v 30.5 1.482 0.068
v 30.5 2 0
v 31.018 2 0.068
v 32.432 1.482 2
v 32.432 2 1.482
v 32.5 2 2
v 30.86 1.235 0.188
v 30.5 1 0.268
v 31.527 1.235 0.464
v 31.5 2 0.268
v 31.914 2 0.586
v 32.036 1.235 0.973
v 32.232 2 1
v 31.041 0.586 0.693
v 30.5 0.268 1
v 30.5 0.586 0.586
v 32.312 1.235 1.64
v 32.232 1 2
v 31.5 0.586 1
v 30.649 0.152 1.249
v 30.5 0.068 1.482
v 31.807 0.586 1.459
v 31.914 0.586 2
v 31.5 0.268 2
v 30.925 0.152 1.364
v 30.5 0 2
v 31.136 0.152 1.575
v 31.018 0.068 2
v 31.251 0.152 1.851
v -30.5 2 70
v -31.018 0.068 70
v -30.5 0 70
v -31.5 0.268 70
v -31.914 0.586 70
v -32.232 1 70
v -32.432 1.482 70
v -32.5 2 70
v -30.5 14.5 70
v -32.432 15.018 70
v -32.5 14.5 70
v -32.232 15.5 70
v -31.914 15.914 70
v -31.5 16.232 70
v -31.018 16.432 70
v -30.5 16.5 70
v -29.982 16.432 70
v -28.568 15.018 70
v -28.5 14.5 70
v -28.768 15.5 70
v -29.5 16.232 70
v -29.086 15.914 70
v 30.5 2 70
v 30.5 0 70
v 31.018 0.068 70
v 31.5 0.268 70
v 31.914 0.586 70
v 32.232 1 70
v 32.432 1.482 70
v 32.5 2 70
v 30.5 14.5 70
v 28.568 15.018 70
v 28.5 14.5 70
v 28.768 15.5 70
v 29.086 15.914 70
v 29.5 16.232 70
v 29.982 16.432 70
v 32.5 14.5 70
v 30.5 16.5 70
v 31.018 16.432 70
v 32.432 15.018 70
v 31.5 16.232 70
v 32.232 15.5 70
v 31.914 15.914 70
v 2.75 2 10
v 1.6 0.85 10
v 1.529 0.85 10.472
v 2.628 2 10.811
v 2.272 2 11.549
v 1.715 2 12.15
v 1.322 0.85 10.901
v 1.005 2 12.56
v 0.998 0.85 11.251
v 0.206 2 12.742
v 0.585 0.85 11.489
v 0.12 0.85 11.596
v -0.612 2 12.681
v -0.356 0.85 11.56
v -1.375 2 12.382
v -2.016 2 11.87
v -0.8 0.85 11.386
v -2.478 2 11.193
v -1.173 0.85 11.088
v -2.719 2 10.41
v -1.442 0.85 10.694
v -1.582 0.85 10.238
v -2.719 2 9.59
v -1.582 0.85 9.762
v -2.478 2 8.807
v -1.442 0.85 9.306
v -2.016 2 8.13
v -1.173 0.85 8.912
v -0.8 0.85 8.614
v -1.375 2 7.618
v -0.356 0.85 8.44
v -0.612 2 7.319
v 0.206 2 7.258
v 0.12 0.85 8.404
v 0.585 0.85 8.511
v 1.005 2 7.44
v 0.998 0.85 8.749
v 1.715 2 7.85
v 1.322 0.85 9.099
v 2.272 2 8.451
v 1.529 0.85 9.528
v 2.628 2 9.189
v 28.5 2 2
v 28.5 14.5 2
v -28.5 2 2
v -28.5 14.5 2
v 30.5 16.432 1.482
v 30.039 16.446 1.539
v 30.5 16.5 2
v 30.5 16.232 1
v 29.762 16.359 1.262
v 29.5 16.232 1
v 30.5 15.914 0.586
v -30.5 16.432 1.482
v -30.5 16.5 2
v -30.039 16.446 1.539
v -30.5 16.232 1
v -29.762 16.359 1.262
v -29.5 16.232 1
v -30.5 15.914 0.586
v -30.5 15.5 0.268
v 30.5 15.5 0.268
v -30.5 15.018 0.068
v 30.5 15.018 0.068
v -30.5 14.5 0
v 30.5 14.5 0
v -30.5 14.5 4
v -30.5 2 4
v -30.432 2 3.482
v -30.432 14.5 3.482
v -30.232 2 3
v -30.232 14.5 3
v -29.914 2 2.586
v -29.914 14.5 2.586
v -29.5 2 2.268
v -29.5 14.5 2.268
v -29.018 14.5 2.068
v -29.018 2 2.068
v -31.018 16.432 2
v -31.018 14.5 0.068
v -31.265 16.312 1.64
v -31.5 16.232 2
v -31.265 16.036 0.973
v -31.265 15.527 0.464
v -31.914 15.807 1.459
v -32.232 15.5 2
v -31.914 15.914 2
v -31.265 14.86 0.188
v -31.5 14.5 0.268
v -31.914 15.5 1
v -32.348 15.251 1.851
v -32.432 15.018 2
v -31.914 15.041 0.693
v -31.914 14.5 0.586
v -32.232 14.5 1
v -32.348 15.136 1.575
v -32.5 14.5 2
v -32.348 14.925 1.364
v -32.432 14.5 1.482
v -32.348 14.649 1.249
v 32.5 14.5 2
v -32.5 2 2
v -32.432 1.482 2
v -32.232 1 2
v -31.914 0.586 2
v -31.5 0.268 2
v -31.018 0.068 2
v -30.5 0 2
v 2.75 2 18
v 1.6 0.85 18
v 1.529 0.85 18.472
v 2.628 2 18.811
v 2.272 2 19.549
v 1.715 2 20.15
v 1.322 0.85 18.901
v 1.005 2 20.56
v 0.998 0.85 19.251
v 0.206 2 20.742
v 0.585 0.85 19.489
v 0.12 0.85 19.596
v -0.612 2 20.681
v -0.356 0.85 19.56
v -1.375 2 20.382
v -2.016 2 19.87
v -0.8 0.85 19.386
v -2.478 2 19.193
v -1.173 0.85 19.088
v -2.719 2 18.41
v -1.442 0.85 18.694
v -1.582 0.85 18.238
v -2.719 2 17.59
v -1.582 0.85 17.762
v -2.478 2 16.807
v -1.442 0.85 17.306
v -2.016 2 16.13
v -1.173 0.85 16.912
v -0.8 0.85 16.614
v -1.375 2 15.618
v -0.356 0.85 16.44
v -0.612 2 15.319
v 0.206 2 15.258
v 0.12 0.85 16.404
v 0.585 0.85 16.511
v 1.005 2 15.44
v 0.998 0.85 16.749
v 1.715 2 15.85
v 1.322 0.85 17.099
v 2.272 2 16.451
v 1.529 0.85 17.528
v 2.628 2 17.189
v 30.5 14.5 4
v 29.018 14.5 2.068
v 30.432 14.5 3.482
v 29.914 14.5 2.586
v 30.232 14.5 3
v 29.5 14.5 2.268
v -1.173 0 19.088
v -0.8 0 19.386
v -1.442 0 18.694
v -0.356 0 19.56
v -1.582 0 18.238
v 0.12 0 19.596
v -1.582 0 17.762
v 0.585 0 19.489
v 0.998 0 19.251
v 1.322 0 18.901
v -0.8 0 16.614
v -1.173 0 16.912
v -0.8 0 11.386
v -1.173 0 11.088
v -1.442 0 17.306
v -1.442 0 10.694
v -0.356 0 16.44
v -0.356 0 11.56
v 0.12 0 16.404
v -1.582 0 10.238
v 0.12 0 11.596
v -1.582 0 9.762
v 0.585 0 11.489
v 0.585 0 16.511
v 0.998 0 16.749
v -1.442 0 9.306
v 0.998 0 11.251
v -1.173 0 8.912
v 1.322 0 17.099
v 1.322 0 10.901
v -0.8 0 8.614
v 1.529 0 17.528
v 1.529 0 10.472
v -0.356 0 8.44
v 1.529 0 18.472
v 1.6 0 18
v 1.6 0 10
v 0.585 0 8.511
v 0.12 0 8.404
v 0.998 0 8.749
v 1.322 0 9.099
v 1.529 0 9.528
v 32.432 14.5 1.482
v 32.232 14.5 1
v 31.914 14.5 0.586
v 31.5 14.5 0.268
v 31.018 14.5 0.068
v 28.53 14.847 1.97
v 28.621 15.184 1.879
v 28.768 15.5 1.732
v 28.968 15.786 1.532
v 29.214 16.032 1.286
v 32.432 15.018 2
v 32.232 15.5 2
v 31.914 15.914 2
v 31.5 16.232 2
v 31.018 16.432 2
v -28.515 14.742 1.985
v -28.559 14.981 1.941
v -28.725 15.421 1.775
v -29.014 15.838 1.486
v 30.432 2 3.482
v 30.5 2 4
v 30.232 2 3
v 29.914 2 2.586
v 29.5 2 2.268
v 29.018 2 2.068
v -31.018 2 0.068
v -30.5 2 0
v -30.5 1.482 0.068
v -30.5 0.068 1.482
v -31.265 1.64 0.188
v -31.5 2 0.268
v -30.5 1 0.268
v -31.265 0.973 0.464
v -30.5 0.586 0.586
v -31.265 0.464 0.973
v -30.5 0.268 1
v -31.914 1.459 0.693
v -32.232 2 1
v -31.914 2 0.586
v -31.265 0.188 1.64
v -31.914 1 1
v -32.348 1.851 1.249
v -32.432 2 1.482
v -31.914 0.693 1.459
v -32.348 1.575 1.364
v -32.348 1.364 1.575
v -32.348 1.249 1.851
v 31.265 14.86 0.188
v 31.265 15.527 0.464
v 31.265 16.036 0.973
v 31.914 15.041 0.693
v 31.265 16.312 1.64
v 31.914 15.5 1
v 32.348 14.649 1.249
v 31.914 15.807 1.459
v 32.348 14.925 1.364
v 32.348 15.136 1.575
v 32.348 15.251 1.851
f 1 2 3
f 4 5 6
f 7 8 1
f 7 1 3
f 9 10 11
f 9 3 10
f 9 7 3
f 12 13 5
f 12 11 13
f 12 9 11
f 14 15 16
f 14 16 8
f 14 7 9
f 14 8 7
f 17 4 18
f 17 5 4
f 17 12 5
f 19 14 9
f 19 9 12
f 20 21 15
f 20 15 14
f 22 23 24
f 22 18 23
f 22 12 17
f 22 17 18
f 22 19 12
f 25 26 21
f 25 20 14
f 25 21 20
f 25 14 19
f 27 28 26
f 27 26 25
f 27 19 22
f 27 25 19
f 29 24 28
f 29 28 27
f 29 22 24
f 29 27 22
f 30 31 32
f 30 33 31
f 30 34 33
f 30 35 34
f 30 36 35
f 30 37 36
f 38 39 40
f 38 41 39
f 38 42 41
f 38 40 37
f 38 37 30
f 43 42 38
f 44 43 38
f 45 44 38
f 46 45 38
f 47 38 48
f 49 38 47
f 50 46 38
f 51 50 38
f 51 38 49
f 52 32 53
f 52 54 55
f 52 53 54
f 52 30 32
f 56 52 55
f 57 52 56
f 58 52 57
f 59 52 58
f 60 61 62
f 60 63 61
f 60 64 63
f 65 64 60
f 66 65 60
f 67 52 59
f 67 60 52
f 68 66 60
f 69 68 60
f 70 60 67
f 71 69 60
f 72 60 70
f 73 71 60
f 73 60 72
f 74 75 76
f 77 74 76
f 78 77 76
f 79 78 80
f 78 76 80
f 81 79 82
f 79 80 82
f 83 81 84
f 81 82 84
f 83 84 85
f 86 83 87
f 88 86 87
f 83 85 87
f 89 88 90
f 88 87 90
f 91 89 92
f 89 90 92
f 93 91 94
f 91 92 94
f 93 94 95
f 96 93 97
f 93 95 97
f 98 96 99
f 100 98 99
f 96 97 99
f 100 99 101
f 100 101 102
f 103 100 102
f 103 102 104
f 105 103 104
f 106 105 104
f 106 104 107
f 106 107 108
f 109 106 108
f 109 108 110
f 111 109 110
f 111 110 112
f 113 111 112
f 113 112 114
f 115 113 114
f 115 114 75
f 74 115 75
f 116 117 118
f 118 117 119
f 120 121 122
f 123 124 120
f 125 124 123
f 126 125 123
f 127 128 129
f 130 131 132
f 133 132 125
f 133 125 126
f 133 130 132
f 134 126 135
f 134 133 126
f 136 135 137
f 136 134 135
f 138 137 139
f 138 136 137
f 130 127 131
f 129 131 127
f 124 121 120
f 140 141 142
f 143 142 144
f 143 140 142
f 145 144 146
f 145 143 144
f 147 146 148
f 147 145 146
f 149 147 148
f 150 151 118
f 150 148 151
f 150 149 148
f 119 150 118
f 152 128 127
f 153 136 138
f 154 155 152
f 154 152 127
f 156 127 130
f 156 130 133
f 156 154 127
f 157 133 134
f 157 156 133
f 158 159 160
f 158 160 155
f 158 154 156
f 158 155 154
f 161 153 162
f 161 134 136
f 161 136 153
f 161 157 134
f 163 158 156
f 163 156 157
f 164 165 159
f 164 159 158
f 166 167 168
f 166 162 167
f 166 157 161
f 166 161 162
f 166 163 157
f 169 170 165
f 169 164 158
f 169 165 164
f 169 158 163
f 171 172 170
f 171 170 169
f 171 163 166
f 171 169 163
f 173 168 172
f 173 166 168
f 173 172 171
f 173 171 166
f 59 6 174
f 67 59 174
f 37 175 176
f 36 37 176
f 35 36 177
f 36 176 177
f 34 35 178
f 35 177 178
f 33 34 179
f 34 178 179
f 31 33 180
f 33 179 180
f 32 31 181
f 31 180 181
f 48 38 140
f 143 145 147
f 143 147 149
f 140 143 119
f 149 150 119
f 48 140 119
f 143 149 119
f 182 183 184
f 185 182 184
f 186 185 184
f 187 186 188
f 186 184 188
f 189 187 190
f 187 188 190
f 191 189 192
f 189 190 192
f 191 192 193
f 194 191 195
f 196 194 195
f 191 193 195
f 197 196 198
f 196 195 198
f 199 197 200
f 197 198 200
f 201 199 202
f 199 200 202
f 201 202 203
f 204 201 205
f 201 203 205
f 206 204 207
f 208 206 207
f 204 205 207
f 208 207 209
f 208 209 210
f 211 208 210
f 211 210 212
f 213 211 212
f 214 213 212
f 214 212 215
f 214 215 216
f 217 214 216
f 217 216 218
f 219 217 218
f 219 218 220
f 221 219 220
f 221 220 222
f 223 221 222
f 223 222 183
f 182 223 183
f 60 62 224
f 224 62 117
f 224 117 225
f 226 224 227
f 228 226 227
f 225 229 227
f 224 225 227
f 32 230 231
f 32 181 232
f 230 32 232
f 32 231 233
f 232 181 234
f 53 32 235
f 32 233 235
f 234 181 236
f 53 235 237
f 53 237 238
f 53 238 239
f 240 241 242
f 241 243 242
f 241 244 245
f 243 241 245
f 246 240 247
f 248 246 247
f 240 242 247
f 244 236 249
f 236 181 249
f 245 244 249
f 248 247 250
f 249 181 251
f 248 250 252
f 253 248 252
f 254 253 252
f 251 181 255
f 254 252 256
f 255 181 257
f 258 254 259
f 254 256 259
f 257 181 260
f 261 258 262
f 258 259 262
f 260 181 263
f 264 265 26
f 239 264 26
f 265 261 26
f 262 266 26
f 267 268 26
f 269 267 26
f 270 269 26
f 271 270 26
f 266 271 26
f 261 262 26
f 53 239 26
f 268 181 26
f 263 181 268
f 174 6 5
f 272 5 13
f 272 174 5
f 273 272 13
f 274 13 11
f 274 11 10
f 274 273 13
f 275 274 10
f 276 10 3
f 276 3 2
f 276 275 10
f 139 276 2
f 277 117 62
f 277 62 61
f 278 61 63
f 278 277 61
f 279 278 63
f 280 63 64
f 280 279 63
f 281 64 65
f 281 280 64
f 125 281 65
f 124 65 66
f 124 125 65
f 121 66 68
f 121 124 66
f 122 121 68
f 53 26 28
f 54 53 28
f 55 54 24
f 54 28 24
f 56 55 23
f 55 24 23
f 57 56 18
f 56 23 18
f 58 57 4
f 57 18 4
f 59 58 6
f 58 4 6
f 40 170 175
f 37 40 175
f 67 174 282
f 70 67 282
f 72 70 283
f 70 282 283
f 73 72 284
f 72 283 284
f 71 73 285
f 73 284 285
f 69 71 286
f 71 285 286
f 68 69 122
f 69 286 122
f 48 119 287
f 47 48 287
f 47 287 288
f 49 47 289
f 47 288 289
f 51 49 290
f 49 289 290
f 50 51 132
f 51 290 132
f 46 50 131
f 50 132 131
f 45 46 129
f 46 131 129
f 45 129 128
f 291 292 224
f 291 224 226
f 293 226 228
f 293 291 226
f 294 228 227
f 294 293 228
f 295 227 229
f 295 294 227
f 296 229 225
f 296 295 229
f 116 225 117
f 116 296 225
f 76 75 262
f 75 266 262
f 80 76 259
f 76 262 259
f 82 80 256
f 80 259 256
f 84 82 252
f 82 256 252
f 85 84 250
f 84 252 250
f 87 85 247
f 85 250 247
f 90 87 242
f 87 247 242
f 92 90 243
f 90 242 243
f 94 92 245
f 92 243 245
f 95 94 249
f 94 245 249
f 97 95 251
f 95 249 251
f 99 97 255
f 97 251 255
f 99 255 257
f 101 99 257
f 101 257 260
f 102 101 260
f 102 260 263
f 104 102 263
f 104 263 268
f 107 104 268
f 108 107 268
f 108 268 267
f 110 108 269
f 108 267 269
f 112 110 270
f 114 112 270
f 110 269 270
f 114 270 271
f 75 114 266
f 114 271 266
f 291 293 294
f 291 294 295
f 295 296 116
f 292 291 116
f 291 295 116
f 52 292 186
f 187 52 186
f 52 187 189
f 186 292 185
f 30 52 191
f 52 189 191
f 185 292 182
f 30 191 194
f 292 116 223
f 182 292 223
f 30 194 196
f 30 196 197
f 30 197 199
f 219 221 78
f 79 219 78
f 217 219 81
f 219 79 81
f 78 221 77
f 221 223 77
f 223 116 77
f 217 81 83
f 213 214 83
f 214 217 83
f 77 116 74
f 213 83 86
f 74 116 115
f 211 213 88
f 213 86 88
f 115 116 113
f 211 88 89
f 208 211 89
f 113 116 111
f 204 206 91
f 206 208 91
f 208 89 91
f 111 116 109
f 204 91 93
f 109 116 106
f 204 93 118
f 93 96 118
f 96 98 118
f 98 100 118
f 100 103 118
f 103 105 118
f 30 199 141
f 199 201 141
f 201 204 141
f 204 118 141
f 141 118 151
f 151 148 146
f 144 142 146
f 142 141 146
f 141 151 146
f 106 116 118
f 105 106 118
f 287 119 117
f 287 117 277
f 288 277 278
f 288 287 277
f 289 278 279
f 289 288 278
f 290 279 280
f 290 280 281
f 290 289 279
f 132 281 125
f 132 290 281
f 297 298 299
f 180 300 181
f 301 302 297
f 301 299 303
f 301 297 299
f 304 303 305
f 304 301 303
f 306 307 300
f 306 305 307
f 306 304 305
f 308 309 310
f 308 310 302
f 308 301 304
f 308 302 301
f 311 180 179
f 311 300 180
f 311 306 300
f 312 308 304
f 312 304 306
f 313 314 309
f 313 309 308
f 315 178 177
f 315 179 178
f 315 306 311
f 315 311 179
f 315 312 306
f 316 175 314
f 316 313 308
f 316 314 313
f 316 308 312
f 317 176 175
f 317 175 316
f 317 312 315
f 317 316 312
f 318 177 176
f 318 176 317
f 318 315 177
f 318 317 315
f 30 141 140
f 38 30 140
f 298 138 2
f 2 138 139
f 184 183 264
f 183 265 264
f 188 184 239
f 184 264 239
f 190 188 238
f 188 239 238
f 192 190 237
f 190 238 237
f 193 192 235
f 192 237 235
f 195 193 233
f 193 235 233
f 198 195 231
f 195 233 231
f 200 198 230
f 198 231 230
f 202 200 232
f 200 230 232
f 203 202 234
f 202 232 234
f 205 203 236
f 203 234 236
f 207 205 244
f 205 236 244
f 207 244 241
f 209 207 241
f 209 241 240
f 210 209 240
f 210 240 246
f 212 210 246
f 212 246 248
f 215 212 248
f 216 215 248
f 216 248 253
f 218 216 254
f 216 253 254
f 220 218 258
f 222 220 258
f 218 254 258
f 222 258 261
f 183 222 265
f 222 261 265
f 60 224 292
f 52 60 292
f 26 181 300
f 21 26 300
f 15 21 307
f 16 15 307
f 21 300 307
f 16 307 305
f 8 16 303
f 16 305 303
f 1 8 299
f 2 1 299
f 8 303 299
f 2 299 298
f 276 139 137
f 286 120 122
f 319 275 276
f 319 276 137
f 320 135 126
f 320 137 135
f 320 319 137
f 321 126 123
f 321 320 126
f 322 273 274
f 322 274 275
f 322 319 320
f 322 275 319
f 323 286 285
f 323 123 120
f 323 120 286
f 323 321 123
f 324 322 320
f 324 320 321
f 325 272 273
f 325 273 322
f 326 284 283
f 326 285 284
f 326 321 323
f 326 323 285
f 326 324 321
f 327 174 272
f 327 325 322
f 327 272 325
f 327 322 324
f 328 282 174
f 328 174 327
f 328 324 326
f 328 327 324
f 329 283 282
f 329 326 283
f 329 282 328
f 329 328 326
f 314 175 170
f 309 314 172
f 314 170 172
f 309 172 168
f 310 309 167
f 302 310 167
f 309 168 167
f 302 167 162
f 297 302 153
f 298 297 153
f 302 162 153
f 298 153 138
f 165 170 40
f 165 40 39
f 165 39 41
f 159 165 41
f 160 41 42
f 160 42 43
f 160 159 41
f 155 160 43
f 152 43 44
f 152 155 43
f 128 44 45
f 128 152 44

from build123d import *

# Parameters (mm, degrees)
F0_DEPTH       = 70
F1_W           = 65
F1_H           = 16.5
F8_DEPTH       = 2
F2_T1_DEPTH    = 12.5
F2_T3_DEPTH    = 73
F2_T5_DEPTH    = 57
F2_T7_DEPTH    = 61
F2_S11_W       = 2.04
F2_S11_H       = 2.04
F2_T12_DEPTH   = 2.04
F2_S17_W       = 2.04
F2_S17_H       = 2.04
F2_T18_DEPTH   = 2.04
F2_S23_W       = 2.04
F2_S23_H       = 2.04
F2_T24_DEPTH   = 2.04
F2_S29_W       = 2.04
F2_S29_H       = 2.04
F2_T30_DEPTH   = 2.04
F2_T37_DEPTH   = 73
F2_T42_DEPTH   = 62
F2_T50_DEPTH   = 62
F2_T55_DEPTH   = 73
F2_T62_DEPTH   = 17.5
F2_T67_DEPTH   = 17.5
F5_D           = 3.2
F5_CSINK_D     = 5.5
F5_CSINK_ANGLE = 90
F6_D           = 3.2
F6_CSINK_D     = 5.5
F6_CSINK_ANGLE = 90


# Not quite as in the source:
# - a fillet or chamfer that OpenCascade refuses, or shapes differently, is made with other operations: its cross-section is extruded or revolved along the edge and cut away or added
# - a feature names something its author has since deleted; it is built from what else it names


with BuildPart() as f0:
    # F7 (on Top) → F0 (new body)
    with BuildSketch(Plane.XY):
        Polygon((-32.5, 16.5), (-32.5, 0), (32.5, 0), (32.5, 16.5), (28.5, 16.5), (28.5, 14.5), (30.5, 14.5), (30.5, 2), (-30.5, 2), (-30.5, 14.5), (-28.5, 14.5), (-28.5, 16.5), align=None)
    extrude(amount=F0_DEPTH)

    # F1 (on face) → F8 (join)
    with BuildSketch(Plane(origin=(0, 0, 0), x_dir=(1, 0, 0), z_dir=(0, 0, -1))):
        with Locations((0, -8.25)):
            Rectangle(F1_W, F1_H)
    extrude(amount=-F8_DEPTH)

    # F2: fillet of radius 2 on 13 edges, made by hand

    # F2_s2 → F2_t1 (cut)
    with BuildSketch(Plane.XZ.offset(-14.5)):
        with BuildLine():
            ThreePointArc((32.5, 2), (31.9142135624, 0.5857864376), (30.5, 0))
            Line((30.5, 0), (32.5, 0))
            Line((32.5, 0), (32.5, 2))
        make_face()
        with BuildLine():
            ThreePointArc((-32.5, 2), (-31.9142135624, 0.5857864376), (-30.5, 0))
            Line((-30.5, 0), (-32.5, 0))
            Line((-32.5, 0), (-32.5, 2))
        make_face()
    extrude(amount=F2_T1_DEPTH, mode=Mode.SUBTRACT)

    # F2_s4 → F2_t3 (cut)
    with BuildSketch(Plane.XY.offset(2)):
        with BuildLine():
            ThreePointArc((-32.5, 2), (-31.9142135624, 0.5857864376), (-30.5, 0))
            Line((-30.5, 0), (-32.5, 0))
            Line((-32.5, 0), (-32.5, 2))
        make_face()
        with BuildLine():
            ThreePointArc((30.5, 0), (31.9142135624, 0.5857864376), (32.5, 2))
            Line((32.5, 2), (32.5, 0))
            Line((32.5, 0), (30.5, 0))
        make_face()
        with BuildLine():
            ThreePointArc((-32.5, 14.5), (-31.9142135624, 15.9142135624), (-30.5, 16.5))
            Line((-30.5, 16.5), (-32.5, 16.5))
            Line((-32.5, 16.5), (-32.5, 14.5))
        make_face()
        with BuildLine():
            ThreePointArc((32.5, 14.5), (31.9142135624, 15.9142135624), (30.5, 16.5))
            Line((30.5, 16.5), (32.5, 16.5))
            Line((32.5, 16.5), (32.5, 14.5))
        make_face()
        with BuildLine():
            ThreePointArc((-28.5, 14.5), (-29.0857864376, 15.9142135624), (-30.5, 16.5))
            Line((-30.5, 16.5), (-28.5, 16.5))
            Line((-28.5, 16.5), (-28.5, 14.5))
        make_face()
        with BuildLine():
            ThreePointArc((28.5, 14.5), (29.0857864376, 15.9142135624), (30.5, 16.5))
            Line((30.5, 16.5), (28.5, 16.5))
            Line((28.5, 16.5), (28.5, 14.5))
        make_face()
    extrude(amount=F2_T3_DEPTH, mode=Mode.SUBTRACT)

    # F2_s6 → F2_t5 (cut)
    with BuildSketch(Plane.YZ.offset(-28.5)):
        with BuildLine():
            ThreePointArc((14.5, 2), (15.9142135624, 1.4142135624), (16.5, 0))
            Line((16.5, 0), (16.5, 2))
            Line((16.5, 2), (14.5, 2))
        make_face()
    extrude(amount=F2_T5_DEPTH, mode=Mode.SUBTRACT)

    # F2_s8 → F2_t7 (cut)
    with BuildSketch(Plane.YZ.offset(-30.5)):
        with BuildLine():
            ThreePointArc((0, 2), (0.5857864376, 0.5857864376), (2, 0))
            Line((2, 0), (0, 0))
            Line((0, 0), (0, 2))
        make_face()
        with BuildLine():
            ThreePointArc((16.5, 2), (15.9142135624, 0.5857864376), (14.5, 0))
            Line((14.5, 0), (16.5, 0))
            Line((16.5, 0), (16.5, 2))
        make_face()
    extrude(amount=F2_T7_DEPTH, mode=Mode.SUBTRACT)


with BuildPart() as f2_tool10:
    # F2_s11 → F2_t12 (new body)
    with BuildSketch(Plane.XZ.offset(-2)):
        with Locations((31.52, 0.98)):
            Rectangle(F2_S11_W, F2_S11_H)
    extrude(amount=F2_T12_DEPTH)

    # F2_s13 → F2_t14 (revolve, cut)
    with BuildSketch(Plane(origin=(30.5, 2, 2), x_dir=(-0.7071067812, 0, 0.7071067812), z_dir=(0.7071067812, 0, 0.7071067812))):
        with BuildLine():
            ThreePointArc((0, -2), (2, 0), (0, 2))
            Line((0, 2), (0, -2))
        make_face()
    revolve(axis=Axis((30.5, 2, 2), (0, -1, 0)), mode=Mode.SUBTRACT)


with BuildPart() as f0_1:
    add(f0.part)

    # F2_t9: cut F2_tool10
    add(f2_tool10.part, mode=Mode.SUBTRACT)


with BuildPart() as f2_tool16:
    # F2_s17 → F2_t18 (new body)
    with BuildSketch(Plane.YZ.offset(30.5)):
        with Locations((15.52, 0.98)):
            Rectangle(F2_S17_W, F2_S17_H)
    extrude(amount=F2_T18_DEPTH)

    # F2_s19 → F2_t20 (revolve, cut)
    with BuildSketch(Plane(origin=(30.5, 14.5, 2), x_dir=(0, -0.7071067812, 0.7071067812), z_dir=(0, 0.7071067812, 0.7071067812))):
        with BuildLine():
            ThreePointArc((0, -2), (2, 0), (0, 2))
            Line((0, 2), (0, -2))
        make_face()
    revolve(axis=Axis((30.5, 14.5, 2), (1, 0, 0)), mode=Mode.SUBTRACT)


with BuildPart() as f0_2:
    add(f0_1.part)

    # F2_t15: cut F2_tool16
    add(f2_tool16.part, mode=Mode.SUBTRACT)


with BuildPart() as f2_tool22:
    # F2_s23 → F2_t24 (new body)
    with BuildSketch(Plane.YZ.offset(-30.5)):
        with Locations((15.52, 0.98)):
            Rectangle(F2_S23_W, F2_S23_H)
    extrude(amount=-F2_T24_DEPTH)

    # F2_s25 → F2_t26 (revolve, cut)
    with BuildSketch(Plane(origin=(-30.5, 14.5, 2), x_dir=(0, -0.7071067812, 0.7071067812), z_dir=(0, -0.7071067812, -0.7071067812))):
        with BuildLine():
            ThreePointArc((0, -2), (2, 0), (0, 2))
            Line((0, 2), (0, -2))
        make_face()
    revolve(axis=Axis((-30.5, 14.5, 2), (-1, 0, 0)), mode=Mode.SUBTRACT)


with BuildPart() as f0_3:
    add(f0_2.part)

    # F2_t21: cut F2_tool22
    add(f2_tool22.part, mode=Mode.SUBTRACT)


with BuildPart() as f2_tool28:
    # F2_s29 → F2_t30 (new body)
    with BuildSketch(Plane.YZ.offset(-30.5)):
        with Locations((0.98, 0.98)):
            Rectangle(F2_S29_W, F2_S29_H)
    extrude(amount=-F2_T30_DEPTH)

    # F2_s31 → F2_t32 (revolve, cut)
    with BuildSketch(Plane(origin=(-30.5, 2, 2), x_dir=(0, 0.7071067812, 0.7071067812), z_dir=(0, -0.7071067812, 0.7071067812))):
        with BuildLine():
            ThreePointArc((0, -2), (2, 0), (0, 2))
            Line((0, 2), (0, -2))
        make_face()
    revolve(axis=Axis((-30.5, 2, 2), (-1, 0, 0)), mode=Mode.SUBTRACT)


with BuildPart() as f0_4:
    add(f0_3.part)

    # F2_t27: cut F2_tool28
    add(f2_tool28.part, mode=Mode.SUBTRACT)


with BuildPart() as f2_tool35:
    # F2_s36 → F2_t37 (new body)
    with BuildSketch(Plane.XY.offset(-3)):
        with BuildLine():
            ThreePointArc((-28.5, 14.5), (-29.0857864376, 15.9142135624), (-30.5, 16.5))
            Line((-30.5, 16.5), (-28.5, 16.5))
            Line((-28.5, 16.5), (-28.5, 14.5))
        make_face()
    extrude(amount=F2_T37_DEPTH)

    split(bisect_by=Plane.XY.offset(2), keep=Keep.BOTTOM)

    split(bisect_by=Plane.XY, keep=Keep.TOP)


with BuildPart() as f2_tool40:
    # F2_s41 → F2_t42 (new body)
    with BuildSketch(Plane.YZ.offset(-33.5)):
        with BuildLine():
            ThreePointArc((14.5, 2), (15.9142135624, 1.4142135624), (16.5, 0))
            Line((16.5, 0), (16.5, 2))
            Line((16.5, 2), (14.5, 2))
        make_face()
    extrude(amount=F2_T42_DEPTH)

    split(bisect_by=Plane.YZ.offset(-28.5), keep=Keep.BOTTOM)

    split(bisect_by=Plane.YZ.offset(-30.5), keep=Keep.TOP)


with BuildPart() as f2_tool35_1:
    add(f2_tool35.part)

    # F2_t45: intersect F2_tool40
    add(f2_tool40.part, mode=Mode.INTERSECT)


with BuildPart() as f0_5:
    add(f0_4.part)

    # F2_t33: cut F2_tool35
    add(f2_tool35_1.part, mode=Mode.SUBTRACT)


with BuildPart() as f2_tool48:
    # F2_s49 → F2_t50 (new body)
    with BuildSketch(Plane.YZ.offset(-28.5)):
        with BuildLine():
            ThreePointArc((14.5, 2), (15.9142135624, 1.4142135624), (16.5, 0))
            Line((16.5, 0), (16.5, 2))
            Line((16.5, 2), (14.5, 2))
        make_face()
    extrude(amount=F2_T50_DEPTH)

    split(bisect_by=Plane.YZ.offset(30.5), keep=Keep.BOTTOM)

    split(bisect_by=Plane.YZ.offset(28.5), keep=Keep.TOP)


with BuildPart() as f2_tool53:
    # F2_s54 → F2_t55 (new body)
    with BuildSketch(Plane.XY.offset(-3)):
        with BuildLine():
            ThreePointArc((28.5, 14.5), (29.0857864376, 15.9142135624), (30.5, 16.5))
            Line((30.5, 16.5), (28.5, 16.5))
            Line((28.5, 16.5), (28.5, 14.5))
        make_face()
    extrude(amount=F2_T55_DEPTH)

    split(bisect_by=Plane.XY.offset(2), keep=Keep.BOTTOM)

    split(bisect_by=Plane.XY, keep=Keep.TOP)


with BuildPart() as f2_tool48_1:
    add(f2_tool48.part)

    # F2_t58: intersect F2_tool53
    add(f2_tool53.part, mode=Mode.INTERSECT)


with BuildPart() as f0_6:
    add(f0_5.part)

    # F2_t46: cut F2_tool48
    add(f2_tool48_1.part, mode=Mode.SUBTRACT)


with BuildPart() as f2_tool60:
    # F2_s61 → F2_t62 (new body)
    with BuildSketch(Plane.XZ.offset(3)):
        with BuildLine():
            ThreePointArc((30.5, 4), (29.9142135624, 2.5857864376), (28.5, 2))
            Line((28.5, 2), (30.5, 2))
            Line((30.5, 2), (30.5, 4))
        make_face()
    extrude(amount=-F2_T62_DEPTH)

    split(bisect_by=Plane.XZ, keep=Keep.BOTTOM)


with BuildPart() as f0_7:
    add(f0_6.part)

    # F2_t59: union F2_tool60
    add(f2_tool60.part)


with BuildPart() as f2_tool65:
    # F2_s66 → F2_t67 (new body)
    with BuildSketch(Plane.XZ.offset(-14.5)):
        with BuildLine():
            ThreePointArc((-30.5, 4), (-29.9142135624, 2.5857864376), (-28.5, 2))
            Line((-28.5, 2), (-30.5, 2))
            Line((-30.5, 2), (-30.5, 4))
        make_face()
    extrude(amount=F2_T67_DEPTH)

    split(bisect_by=Plane.XZ, keep=Keep.BOTTOM)


with BuildPart() as f0_8:
    add(f0_7.part)

    # F2_t64: union F2_tool65
    add(f2_tool65.part)

    # F5 (through all)
    with Locations(Plane(origin=(0, 2, 0), x_dir=(-1, 0, 0), z_dir=(0, 1, 0))):
        with Locations((0, 18)):
            CounterSinkHole(F5_D / 2, F5_CSINK_D / 2, counter_sink_angle=F5_CSINK_ANGLE)

    # F6 (through all)
    with Locations(Plane(origin=(0, 2, 0), x_dir=(-1, 0, 0), z_dir=(0, 1, 0))):
        with Locations((0, 10)):
            CounterSinkHole(F6_D / 2, F6_CSINK_D / 2, counter_sink_angle=F6_CSINK_ANGLE)


solid = f0_8.part
